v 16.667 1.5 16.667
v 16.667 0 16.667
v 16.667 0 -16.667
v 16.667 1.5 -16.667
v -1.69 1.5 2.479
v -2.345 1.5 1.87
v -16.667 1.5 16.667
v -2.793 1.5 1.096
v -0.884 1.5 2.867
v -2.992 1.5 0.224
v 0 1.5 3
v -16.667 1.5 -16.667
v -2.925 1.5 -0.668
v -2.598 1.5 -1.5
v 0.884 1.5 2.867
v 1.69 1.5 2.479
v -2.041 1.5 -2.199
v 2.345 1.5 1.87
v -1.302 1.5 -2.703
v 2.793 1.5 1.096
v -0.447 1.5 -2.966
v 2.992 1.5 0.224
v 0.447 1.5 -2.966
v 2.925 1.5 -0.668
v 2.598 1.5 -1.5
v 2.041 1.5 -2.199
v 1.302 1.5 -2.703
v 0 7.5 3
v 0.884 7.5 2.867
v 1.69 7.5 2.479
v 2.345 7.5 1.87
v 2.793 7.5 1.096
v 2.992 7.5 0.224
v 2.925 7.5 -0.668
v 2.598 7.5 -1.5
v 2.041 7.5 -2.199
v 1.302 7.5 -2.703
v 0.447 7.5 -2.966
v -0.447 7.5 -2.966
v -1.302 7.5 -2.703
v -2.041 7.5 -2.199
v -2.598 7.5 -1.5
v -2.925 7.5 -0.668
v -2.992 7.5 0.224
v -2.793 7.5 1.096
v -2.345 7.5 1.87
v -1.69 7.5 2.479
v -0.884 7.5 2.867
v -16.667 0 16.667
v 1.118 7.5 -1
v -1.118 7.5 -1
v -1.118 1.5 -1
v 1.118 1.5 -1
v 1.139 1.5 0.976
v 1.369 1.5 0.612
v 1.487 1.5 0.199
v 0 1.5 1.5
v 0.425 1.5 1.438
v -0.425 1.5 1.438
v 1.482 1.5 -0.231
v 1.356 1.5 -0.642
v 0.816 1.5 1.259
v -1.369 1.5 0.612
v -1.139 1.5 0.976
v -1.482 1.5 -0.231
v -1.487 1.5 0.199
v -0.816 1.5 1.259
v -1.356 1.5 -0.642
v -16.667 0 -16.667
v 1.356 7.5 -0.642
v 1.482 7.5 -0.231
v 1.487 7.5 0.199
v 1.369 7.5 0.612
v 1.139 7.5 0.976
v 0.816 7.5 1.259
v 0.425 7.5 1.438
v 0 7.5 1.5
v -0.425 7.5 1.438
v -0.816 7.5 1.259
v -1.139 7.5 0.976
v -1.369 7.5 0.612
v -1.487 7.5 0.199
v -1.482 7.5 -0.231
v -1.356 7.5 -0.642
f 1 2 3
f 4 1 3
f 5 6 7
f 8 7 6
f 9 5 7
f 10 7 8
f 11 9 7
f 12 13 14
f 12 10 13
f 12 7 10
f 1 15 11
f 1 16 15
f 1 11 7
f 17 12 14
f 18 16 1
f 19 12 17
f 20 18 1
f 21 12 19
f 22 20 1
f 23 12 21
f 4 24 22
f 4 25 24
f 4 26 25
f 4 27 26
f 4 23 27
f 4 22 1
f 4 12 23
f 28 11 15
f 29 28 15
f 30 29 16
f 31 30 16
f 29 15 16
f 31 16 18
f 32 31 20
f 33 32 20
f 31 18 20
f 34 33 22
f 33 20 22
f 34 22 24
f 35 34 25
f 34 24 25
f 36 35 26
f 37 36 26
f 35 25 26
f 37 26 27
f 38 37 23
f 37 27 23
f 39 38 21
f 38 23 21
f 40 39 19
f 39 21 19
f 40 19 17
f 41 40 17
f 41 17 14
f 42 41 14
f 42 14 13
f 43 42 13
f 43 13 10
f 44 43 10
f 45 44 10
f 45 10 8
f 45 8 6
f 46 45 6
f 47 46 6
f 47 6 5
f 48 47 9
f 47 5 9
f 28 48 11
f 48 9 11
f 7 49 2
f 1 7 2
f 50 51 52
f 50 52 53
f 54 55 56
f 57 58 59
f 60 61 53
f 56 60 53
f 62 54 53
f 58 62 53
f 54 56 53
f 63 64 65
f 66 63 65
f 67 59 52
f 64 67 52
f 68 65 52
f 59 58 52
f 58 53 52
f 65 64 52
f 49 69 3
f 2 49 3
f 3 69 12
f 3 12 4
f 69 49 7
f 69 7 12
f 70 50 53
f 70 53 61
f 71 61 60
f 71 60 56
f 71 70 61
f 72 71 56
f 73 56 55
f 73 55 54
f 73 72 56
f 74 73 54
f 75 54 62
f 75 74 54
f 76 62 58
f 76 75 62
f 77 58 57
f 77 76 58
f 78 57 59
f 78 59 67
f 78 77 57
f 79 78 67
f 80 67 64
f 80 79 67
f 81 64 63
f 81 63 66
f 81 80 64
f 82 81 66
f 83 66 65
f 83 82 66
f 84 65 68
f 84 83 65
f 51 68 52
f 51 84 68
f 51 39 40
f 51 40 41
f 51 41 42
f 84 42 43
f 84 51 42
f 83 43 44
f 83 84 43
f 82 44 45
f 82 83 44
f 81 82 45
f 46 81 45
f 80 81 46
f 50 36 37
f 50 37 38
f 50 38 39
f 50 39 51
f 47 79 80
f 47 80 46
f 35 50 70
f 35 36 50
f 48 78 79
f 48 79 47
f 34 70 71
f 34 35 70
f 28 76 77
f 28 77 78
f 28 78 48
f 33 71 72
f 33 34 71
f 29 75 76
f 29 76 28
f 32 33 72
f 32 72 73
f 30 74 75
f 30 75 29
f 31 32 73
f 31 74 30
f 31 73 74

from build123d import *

# Parameters (mm, degrees)
SKETCH_1_W          = 33.333333334
SKETCH_1_H          = 33.333333334
EXTRUDE_1_DEPTH     = 1.5
SKETCH_2_R          = 3
EXTRUDE_2_DEPTH     = 6
CUT_EXTRUDE_1_DEPTH = 6


with BuildPart() as part:
    # 草图1 → 凸台-拉伸1 (new body)
    with BuildSketch(Plane(origin=(0, 0, 0), x_dir=(1, 0, 0), z_dir=(0, 1, 0))):
        Rectangle(SKETCH_1_W, SKETCH_1_H)
    extrude(amount=EXTRUDE_1_DEPTH)

    # 草图2 → 凸台-拉伸2 (add)
    with BuildSketch(Plane(origin=(0, 1.5, 0), x_dir=(1, 0, 0), z_dir=(0, 1, 0))):
        with Locations(Location((0, 0, 0), (0, 0, 270))):
            Circle(SKETCH_2_R)
    extrude(amount=EXTRUDE_2_DEPTH)

    # 草图3 → 切除-拉伸1 (cut)
    with BuildSketch(Plane(origin=(0, 7.5, 0), x_dir=(1, 0, 0), z_dir=(0, 1, 0))):
        with BuildLine():
            Line((-1.118033989, 1), (1.118033989, 1))
            ThreePointArc((1.118033989, 1), (0, -1.5), (-1.118033989, 1))
        make_face()
    extrude(amount=-CUT_EXTRUDE_1_DEPTH, mode=Mode.SUBTRACT)


solid = part.part
